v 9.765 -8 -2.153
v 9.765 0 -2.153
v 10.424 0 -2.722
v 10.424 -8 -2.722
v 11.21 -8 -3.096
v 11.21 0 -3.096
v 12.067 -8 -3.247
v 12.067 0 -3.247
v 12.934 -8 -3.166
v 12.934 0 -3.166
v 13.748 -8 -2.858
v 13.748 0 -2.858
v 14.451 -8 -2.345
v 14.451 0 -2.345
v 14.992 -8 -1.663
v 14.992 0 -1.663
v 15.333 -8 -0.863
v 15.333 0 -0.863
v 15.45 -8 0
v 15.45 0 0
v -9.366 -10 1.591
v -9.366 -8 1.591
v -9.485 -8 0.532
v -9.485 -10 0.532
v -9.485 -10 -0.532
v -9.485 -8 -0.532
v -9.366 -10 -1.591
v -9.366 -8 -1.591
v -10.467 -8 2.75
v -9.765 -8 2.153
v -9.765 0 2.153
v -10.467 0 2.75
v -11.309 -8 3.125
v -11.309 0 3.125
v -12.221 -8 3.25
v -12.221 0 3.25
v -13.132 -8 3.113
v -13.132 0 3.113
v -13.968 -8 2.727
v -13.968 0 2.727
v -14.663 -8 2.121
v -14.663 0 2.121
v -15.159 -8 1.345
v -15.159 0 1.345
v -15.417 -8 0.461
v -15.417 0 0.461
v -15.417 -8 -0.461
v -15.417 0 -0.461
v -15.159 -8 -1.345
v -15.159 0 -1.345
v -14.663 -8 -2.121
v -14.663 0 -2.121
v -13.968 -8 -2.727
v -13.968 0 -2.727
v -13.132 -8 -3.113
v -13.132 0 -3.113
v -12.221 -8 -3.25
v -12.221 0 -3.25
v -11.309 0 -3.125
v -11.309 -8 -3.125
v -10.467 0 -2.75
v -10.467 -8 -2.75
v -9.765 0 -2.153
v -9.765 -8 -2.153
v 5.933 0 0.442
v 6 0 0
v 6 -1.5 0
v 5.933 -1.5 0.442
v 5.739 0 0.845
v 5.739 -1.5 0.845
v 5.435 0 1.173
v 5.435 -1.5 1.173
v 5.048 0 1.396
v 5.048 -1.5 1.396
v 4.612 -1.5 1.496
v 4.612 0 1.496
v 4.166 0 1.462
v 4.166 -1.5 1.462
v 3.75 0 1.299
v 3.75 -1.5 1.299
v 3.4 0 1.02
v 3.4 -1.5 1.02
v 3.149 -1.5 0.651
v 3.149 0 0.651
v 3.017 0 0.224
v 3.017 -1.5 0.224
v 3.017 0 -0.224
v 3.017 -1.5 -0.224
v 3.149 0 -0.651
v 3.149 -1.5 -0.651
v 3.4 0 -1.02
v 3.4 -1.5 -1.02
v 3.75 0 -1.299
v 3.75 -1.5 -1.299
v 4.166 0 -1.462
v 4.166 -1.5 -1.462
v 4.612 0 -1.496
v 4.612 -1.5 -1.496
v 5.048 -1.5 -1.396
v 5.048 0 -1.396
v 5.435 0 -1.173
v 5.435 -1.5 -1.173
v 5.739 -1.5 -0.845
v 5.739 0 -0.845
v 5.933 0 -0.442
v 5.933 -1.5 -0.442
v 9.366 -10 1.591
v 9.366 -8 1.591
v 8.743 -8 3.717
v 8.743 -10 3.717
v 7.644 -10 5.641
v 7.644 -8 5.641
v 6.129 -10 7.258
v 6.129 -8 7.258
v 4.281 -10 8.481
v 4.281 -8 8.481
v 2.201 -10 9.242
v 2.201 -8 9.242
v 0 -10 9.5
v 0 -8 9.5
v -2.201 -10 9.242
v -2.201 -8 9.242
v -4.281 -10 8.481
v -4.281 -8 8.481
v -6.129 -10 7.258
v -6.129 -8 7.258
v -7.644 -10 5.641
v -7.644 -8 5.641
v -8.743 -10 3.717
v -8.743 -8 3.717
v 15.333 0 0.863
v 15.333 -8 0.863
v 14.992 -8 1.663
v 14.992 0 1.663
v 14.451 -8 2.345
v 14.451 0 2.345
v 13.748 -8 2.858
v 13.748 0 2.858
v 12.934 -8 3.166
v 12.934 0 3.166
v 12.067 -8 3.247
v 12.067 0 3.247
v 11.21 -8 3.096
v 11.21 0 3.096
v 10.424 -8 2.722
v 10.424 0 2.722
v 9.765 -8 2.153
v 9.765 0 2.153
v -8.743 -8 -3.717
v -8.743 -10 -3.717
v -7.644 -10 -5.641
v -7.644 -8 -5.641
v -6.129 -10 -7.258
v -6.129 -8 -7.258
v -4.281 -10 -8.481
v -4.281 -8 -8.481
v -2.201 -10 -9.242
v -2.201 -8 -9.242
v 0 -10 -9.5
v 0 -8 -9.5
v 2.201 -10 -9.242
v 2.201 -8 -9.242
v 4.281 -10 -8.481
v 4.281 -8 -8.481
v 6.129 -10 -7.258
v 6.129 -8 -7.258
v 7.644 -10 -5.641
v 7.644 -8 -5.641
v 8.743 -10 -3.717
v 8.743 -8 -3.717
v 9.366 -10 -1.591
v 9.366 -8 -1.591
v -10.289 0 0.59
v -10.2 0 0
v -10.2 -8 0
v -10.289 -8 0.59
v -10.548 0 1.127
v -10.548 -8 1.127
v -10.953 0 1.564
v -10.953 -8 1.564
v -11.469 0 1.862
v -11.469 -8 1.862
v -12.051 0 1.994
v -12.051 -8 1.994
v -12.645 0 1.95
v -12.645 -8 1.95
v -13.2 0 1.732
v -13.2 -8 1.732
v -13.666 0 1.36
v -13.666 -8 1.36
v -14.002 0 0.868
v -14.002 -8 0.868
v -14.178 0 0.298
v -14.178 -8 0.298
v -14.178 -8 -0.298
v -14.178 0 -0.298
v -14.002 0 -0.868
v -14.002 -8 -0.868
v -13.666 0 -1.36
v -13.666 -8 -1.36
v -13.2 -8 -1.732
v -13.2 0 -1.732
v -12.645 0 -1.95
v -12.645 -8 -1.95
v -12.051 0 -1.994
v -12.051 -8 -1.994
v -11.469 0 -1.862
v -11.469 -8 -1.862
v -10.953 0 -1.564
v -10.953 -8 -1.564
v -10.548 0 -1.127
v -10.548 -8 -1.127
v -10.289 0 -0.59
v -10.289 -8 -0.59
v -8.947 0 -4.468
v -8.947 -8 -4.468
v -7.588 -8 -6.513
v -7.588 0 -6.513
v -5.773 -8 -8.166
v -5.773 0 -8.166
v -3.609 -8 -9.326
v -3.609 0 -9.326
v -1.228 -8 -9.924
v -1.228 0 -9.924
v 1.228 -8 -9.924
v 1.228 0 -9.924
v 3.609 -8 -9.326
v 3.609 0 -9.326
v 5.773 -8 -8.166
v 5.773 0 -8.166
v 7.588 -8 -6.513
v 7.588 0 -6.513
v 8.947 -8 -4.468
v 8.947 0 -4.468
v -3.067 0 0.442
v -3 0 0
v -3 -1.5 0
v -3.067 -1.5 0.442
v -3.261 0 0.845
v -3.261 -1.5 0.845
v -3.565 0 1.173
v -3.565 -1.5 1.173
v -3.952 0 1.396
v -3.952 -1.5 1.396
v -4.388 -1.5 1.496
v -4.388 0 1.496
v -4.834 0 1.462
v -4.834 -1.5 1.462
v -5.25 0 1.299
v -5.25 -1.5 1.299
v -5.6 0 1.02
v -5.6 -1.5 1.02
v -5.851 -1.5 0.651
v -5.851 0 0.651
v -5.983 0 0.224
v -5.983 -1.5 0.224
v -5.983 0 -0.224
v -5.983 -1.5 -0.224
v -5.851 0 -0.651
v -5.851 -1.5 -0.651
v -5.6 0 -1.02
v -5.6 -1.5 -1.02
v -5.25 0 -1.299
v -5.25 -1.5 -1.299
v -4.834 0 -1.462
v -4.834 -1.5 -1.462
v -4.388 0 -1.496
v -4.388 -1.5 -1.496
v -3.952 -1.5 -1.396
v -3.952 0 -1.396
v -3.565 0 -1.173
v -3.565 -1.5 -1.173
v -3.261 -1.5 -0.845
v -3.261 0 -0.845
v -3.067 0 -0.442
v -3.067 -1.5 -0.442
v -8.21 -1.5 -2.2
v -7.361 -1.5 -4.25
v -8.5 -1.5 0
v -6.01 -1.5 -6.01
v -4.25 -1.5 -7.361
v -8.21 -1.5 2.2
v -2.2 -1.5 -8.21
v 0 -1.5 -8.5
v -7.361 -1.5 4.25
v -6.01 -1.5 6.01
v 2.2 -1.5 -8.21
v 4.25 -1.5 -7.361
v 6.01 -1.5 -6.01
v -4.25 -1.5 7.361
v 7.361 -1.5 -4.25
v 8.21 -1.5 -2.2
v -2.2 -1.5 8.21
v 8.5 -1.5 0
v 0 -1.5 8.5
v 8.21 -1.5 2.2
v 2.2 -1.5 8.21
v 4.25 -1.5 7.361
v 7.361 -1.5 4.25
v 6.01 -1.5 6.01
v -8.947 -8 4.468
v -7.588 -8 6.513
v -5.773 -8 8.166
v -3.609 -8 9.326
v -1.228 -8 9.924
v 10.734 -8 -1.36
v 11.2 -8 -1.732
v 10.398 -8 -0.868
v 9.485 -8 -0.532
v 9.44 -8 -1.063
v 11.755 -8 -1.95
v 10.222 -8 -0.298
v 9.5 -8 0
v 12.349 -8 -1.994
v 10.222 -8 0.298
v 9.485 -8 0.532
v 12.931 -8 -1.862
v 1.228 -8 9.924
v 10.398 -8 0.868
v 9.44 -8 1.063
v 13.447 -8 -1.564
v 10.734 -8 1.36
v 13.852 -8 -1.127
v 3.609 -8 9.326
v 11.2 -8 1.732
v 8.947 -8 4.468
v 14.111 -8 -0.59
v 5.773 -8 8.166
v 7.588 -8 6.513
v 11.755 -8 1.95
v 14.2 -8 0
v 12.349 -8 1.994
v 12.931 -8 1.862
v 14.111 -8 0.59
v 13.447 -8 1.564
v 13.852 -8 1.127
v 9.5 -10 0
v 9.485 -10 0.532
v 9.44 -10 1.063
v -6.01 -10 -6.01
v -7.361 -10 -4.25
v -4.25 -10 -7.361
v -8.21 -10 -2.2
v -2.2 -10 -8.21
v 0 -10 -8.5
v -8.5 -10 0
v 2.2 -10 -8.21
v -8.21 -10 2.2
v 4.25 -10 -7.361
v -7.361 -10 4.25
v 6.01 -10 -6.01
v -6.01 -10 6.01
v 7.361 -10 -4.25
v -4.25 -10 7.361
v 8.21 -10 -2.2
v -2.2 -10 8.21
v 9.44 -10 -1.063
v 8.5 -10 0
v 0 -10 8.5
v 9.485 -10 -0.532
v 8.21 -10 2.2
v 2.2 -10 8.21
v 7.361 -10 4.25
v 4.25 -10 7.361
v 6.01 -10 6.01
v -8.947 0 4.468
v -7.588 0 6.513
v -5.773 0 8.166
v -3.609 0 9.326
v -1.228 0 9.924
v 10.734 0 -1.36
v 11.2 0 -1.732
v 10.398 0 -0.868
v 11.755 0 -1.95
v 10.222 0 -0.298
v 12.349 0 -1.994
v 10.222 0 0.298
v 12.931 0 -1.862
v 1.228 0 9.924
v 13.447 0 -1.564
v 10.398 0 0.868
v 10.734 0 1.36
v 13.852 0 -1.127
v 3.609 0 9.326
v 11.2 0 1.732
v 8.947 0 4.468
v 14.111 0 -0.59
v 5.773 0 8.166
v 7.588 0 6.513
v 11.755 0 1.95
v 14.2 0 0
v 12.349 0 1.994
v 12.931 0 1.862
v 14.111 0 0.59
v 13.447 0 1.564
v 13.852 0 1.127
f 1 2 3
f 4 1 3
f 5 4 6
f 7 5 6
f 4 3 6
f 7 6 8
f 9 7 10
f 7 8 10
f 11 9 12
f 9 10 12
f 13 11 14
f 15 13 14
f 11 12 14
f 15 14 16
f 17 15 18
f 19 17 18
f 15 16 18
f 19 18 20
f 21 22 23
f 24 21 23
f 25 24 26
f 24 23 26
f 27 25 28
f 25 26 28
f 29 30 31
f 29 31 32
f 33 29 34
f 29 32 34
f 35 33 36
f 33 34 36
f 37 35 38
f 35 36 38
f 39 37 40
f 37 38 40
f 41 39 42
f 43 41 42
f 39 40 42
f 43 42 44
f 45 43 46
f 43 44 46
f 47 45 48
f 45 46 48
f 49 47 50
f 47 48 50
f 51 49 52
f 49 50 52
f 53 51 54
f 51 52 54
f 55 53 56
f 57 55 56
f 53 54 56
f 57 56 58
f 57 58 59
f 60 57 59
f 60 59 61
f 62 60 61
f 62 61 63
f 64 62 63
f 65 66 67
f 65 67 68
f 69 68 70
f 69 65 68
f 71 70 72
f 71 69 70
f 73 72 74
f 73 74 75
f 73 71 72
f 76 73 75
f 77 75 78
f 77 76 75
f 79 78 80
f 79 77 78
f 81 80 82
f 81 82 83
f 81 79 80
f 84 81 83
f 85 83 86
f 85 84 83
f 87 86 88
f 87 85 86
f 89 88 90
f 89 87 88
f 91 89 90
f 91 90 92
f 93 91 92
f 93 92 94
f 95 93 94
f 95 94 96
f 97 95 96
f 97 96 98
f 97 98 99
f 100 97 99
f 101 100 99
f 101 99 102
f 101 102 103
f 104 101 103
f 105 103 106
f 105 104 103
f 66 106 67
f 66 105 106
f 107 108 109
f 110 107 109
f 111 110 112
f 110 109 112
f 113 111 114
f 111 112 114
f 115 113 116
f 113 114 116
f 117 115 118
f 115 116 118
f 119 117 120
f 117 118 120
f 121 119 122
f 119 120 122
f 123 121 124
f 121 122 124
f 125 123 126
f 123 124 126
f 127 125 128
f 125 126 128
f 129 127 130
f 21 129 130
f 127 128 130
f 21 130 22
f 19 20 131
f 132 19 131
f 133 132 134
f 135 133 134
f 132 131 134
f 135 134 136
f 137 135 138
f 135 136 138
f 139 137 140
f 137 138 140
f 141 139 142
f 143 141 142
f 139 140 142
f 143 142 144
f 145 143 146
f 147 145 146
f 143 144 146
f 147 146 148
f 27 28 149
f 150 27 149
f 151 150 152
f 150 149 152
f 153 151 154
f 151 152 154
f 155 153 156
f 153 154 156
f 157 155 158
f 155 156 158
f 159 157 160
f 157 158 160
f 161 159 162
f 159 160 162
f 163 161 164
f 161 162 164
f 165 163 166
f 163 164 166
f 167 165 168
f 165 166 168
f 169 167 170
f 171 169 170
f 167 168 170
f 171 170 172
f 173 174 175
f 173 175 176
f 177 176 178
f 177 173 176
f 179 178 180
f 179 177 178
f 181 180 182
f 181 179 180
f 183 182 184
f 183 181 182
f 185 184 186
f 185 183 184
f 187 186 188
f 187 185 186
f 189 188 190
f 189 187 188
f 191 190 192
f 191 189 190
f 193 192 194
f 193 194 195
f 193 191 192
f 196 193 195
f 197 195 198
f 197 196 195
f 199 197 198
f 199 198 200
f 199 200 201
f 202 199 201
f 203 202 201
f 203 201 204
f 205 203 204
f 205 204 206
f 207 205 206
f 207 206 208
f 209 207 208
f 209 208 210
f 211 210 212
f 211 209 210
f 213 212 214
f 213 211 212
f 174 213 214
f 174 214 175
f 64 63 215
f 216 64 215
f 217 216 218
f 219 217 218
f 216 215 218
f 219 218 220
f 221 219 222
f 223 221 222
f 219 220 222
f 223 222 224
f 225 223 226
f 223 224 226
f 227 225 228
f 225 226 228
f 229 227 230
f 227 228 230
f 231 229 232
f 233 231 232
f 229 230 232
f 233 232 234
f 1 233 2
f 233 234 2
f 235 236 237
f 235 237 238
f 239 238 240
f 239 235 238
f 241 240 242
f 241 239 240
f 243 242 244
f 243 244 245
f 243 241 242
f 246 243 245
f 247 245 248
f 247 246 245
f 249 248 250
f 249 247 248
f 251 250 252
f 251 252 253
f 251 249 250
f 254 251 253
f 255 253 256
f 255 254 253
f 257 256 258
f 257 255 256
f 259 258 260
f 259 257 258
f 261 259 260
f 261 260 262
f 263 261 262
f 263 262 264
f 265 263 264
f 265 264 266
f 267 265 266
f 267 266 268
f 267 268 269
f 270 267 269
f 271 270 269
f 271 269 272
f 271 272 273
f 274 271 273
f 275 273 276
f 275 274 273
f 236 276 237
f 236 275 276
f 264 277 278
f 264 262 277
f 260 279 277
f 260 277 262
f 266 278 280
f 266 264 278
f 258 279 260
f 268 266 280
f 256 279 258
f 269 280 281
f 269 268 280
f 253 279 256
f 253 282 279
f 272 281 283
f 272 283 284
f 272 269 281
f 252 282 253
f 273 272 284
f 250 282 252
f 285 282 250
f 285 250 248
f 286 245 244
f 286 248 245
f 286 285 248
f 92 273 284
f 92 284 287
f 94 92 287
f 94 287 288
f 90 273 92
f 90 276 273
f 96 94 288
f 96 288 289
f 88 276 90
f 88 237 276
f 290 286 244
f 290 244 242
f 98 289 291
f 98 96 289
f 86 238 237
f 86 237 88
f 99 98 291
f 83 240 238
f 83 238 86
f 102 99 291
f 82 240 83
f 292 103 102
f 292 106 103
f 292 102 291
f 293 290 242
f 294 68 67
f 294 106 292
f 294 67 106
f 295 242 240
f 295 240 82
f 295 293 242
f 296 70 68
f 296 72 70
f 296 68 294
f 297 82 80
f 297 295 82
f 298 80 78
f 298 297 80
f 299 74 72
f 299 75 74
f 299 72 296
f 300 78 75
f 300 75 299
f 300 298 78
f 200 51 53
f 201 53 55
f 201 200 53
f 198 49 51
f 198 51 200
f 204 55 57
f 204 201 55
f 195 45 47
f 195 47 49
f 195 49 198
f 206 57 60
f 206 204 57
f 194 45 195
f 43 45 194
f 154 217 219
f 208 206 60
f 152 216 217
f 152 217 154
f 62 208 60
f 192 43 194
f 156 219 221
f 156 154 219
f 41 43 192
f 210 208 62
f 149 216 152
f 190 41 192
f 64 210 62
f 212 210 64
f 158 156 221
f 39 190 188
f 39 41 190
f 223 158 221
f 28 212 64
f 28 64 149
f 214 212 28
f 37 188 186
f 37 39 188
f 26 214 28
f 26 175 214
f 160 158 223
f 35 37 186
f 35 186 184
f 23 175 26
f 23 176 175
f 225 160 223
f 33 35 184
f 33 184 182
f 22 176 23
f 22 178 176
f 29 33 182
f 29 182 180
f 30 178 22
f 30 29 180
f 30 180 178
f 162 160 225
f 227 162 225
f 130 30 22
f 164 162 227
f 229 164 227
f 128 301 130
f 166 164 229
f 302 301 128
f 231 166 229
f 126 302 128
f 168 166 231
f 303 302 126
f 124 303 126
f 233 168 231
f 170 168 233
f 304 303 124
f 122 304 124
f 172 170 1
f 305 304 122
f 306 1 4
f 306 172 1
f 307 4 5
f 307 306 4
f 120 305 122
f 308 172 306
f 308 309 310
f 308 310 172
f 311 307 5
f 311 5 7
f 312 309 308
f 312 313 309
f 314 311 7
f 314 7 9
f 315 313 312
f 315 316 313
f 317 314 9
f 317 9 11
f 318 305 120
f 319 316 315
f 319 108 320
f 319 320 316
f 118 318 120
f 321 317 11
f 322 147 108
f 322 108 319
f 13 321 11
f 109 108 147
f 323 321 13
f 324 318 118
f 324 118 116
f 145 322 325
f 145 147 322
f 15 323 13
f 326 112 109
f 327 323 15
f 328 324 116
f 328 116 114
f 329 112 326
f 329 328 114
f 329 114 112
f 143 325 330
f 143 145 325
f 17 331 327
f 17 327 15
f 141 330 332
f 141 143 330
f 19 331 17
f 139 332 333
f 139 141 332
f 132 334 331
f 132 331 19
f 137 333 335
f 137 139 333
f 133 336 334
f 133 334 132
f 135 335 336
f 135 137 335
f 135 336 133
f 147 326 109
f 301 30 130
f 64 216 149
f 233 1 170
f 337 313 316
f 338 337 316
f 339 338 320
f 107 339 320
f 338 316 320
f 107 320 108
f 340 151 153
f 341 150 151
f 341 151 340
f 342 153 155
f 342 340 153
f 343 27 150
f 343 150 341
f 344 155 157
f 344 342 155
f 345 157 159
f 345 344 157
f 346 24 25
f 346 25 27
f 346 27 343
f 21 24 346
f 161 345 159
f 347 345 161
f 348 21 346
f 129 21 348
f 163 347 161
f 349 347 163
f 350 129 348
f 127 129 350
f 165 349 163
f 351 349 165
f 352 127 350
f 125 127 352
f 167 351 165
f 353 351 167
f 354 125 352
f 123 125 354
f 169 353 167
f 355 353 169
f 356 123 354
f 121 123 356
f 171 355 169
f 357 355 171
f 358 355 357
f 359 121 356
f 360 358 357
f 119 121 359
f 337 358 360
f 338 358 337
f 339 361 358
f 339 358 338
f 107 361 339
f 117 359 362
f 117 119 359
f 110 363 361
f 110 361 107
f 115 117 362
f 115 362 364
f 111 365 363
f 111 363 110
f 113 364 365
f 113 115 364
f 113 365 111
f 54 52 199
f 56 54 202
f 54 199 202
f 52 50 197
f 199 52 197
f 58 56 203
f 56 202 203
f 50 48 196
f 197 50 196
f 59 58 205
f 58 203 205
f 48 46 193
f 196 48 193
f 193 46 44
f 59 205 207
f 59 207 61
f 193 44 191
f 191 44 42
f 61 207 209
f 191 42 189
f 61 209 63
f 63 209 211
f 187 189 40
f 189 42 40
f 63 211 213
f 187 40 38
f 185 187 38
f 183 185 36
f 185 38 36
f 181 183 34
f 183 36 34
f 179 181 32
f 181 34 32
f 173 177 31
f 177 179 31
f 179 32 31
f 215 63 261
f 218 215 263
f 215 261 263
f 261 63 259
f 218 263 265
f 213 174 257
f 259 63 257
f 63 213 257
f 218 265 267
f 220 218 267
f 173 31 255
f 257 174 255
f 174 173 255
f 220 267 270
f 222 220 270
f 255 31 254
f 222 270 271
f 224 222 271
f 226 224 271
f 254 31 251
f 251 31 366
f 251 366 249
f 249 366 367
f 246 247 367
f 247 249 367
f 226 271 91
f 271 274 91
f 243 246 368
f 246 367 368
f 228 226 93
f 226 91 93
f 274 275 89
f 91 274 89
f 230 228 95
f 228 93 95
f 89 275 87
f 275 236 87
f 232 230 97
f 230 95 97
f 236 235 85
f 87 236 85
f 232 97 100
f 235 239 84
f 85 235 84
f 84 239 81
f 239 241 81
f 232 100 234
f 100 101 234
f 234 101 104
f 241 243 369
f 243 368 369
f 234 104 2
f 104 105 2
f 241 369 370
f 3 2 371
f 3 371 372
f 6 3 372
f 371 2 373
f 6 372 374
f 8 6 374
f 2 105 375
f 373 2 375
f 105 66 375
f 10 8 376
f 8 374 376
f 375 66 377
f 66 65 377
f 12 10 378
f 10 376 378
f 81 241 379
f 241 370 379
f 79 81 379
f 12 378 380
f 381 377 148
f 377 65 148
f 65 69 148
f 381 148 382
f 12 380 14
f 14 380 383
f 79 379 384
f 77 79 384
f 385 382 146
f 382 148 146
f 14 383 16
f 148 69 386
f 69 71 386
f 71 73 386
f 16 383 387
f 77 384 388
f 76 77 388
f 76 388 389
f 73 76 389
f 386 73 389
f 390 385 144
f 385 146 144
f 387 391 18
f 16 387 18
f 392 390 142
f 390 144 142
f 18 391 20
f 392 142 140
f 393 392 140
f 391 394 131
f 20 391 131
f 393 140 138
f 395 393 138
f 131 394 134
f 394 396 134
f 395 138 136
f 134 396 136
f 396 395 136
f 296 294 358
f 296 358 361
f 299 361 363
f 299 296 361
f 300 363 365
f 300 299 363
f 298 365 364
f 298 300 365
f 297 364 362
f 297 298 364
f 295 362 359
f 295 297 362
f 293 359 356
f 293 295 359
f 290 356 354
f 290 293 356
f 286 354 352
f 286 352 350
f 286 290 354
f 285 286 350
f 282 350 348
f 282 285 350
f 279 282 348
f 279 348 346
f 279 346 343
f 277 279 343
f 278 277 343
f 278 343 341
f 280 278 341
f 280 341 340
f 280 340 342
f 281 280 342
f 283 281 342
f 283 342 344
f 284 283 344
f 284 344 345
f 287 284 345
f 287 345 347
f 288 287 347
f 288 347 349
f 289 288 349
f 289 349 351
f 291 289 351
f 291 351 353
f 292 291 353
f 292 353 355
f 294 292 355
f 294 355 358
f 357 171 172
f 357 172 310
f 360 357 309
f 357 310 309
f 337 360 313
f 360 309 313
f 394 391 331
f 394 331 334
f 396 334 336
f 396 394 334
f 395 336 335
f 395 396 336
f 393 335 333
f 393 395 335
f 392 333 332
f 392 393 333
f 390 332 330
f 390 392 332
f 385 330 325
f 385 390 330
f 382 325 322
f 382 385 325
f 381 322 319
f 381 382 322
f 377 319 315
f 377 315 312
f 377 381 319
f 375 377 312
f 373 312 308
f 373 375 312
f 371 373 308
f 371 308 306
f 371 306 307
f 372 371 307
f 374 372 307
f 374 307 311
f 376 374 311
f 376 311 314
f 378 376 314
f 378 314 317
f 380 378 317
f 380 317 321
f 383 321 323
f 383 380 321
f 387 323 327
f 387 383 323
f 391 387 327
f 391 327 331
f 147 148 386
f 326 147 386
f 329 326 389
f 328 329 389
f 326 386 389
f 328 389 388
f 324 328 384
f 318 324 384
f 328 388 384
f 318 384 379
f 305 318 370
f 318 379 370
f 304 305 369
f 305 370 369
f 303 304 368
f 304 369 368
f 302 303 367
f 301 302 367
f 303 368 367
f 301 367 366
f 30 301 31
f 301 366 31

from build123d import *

# Parameters (mm, degrees)
F0_R     = 8.5
F1_DEPTH = 10
F0_R_2   = 2
F2_DEPTH = 8
F0_R_3   = 1.5
F3_DEPTH = 1.5
F4_DEPTH = 10


with BuildPart() as f1:
    # F0 (on Front) → F1 (new body)
    with BuildSketch(Plane.XZ):
        with BuildLine():
            ThreePointArc((9.3658811475, -1.5906823473), (8.95, 0), (9.3658811475, 1.5906823473))
            ThreePointArc((9.3658811475, 1.5906823473), (0, 9.5), (-9.3658811475, 1.5906823473))
            ThreePointArc((-9.3658811475, 1.5906823473), (-9.0556887662, 0.8220747319), (-8.95, 0))
            ThreePointArc((-8.95, 0), (-9.0556887662, -0.8220747319), (-9.3658811475, -1.5906823473))
            ThreePointArc((-9.3658811475, -1.5906823473), (0, -9.5), (9.3658811475, -1.5906823473))
        make_face()
        Circle(F0_R, mode=Mode.SUBTRACT)
    extrude(amount=F1_DEPTH)

    # F0 (on Front) → F2 (join)
    with BuildSketch(Plane.XZ):
        with BuildLine():
            ThreePointArc((9.7654713115, -2.1530374044), (9.941194926, -1.082886625), (10, 0))
            ThreePointArc((10, 0), (9.941194926, 1.082886625), (9.7654713115, 2.1530374044))
            ThreePointArc((9.7654713115, 2.1530374044), (9.550712826, 1.8824923558), (9.3658811475, 1.5906823473))
            ThreePointArc((9.3658811475, 1.5906823473), (9.4664109065, 0.7981632347), (9.5, 0))
            ThreePointArc((9.5, 0), (9.4664109065, -0.7981632347), (9.3658811475, -1.5906823473))
            ThreePointArc((9.3658811475, -1.5906823473), (9.550712826, -1.8824923558), (9.7654713115, -2.1530374044))
        make_face()
        with BuildLine():
            ThreePointArc((9.7654713115, 2.1530374044), (9.941194926, 1.082886625), (10, 0))
            ThreePointArc((10, 0), (9.941194926, -1.082886625), (9.7654713115, -2.1530374044))
            ThreePointArc((9.7654713115, -2.1530374044), (13.3511476366, -3.0393024066), (15.45, 0))
            ThreePointArc((15.45, 0), (13.3511476366, 3.0393024066), (9.7654713115, 2.1530374044))
        make_face()
        with Locations((12.2, 0)):
            Circle(F0_R_2, mode=Mode.SUBTRACT)
        with BuildLine():
            ThreePointArc((9.3658811475, 1.5906823473), (9.550712826, 1.8824923558), (9.7654713115, 2.1530374044))
            ThreePointArc((9.7654713115, 2.1530374044), (0, 10), (-9.7654713115, 2.1530374044))
            ThreePointArc((-9.7654713115, 2.1530374044), (-9.550712826, 1.8824923558), (-9.3658811475, 1.5906823473))
            ThreePointArc((-9.3658811475, 1.5906823473), (0, 9.5), (9.3658811475, 1.5906823473))
        make_face()
        with BuildLine():
            ThreePointArc((-9.7654713115, -2.1530374044), (0, -10), (9.7654713115, -2.1530374044))
            ThreePointArc((9.7654713115, -2.1530374044), (9.550712826, -1.8824923558), (9.3658811475, -1.5906823473))
            ThreePointArc((9.3658811475, -1.5906823473), (0, -9.5), (-9.3658811475, -1.5906823473))
            ThreePointArc((-9.3658811475, -1.5906823473), (-9.550712826, -1.8824923558), (-9.7654713115, -2.1530374044))
        make_face()
        with BuildLine():
            ThreePointArc((-9.3658811475, 1.5906823473), (-9.550712826, 1.8824923558), (-9.7654713115, 2.1530374044))
            ThreePointArc((-9.7654713115, 2.1530374044), (-10, 0), (-9.7654713115, -2.1530374044))
            ThreePointArc((-9.7654713115, -2.1530374044), (-9.550712826, -1.8824923558), (-9.3658811475, -1.5906823473))
            ThreePointArc((-9.3658811475, -1.5906823473), (-9.5, 0), (-9.3658811475, 1.5906823473))
        make_face()
        with BuildLine():
            ThreePointArc((-9.7654713115, -2.1530374044), (-10, 0), (-9.7654713115, 2.1530374044))
            ThreePointArc((-9.7654713115, 2.1530374044), (-15.45, 0), (-9.7654713115, -2.1530374044))
        make_face()
        with Locations((-12.2, 0)):
            Circle(F0_R_2, mode=Mode.SUBTRACT)
    extrude(amount=F2_DEPTH)

    # F0 (on Front) → F3 (join)
    with BuildSketch(Plane.XZ):
        Circle(F0_R)
        with Locations((-4.5, 0)):
            Circle(F0_R_3, mode=Mode.SUBTRACT)
        with Locations((4.5, 0)):
            Circle(F0_R_3, mode=Mode.SUBTRACT)
    extrude(amount=F3_DEPTH)

    # F0 (on Front) → F4 (join)
    with BuildSketch(Plane.XZ):
        with BuildLine():
            ThreePointArc((9.5, 0), (9.4664109065, 0.7981632347), (9.3658811475, 1.5906823473))
            ThreePointArc((9.3658811475, 1.5906823473), (8.95, 0), (9.3658811475, -1.5906823473))
            ThreePointArc((9.3658811475, -1.5906823473), (9.4664109065, -0.7981632347), (9.5, 0))
        make_face()
        with BuildLine():
            ThreePointArc((-8.95, 0), (-9.0556887662, 0.8220747319), (-9.3658811475, 1.5906823473))
            ThreePointArc((-9.3658811475, 1.5906823473), (-9.5, 0), (-9.3658811475, -1.5906823473))
            ThreePointArc((-9.3658811475, -1.5906823473), (-9.0556887662, -0.8220747319), (-8.95, 0))
        make_face()
    extrude(amount=F4_DEPTH)


solid = f1.part
